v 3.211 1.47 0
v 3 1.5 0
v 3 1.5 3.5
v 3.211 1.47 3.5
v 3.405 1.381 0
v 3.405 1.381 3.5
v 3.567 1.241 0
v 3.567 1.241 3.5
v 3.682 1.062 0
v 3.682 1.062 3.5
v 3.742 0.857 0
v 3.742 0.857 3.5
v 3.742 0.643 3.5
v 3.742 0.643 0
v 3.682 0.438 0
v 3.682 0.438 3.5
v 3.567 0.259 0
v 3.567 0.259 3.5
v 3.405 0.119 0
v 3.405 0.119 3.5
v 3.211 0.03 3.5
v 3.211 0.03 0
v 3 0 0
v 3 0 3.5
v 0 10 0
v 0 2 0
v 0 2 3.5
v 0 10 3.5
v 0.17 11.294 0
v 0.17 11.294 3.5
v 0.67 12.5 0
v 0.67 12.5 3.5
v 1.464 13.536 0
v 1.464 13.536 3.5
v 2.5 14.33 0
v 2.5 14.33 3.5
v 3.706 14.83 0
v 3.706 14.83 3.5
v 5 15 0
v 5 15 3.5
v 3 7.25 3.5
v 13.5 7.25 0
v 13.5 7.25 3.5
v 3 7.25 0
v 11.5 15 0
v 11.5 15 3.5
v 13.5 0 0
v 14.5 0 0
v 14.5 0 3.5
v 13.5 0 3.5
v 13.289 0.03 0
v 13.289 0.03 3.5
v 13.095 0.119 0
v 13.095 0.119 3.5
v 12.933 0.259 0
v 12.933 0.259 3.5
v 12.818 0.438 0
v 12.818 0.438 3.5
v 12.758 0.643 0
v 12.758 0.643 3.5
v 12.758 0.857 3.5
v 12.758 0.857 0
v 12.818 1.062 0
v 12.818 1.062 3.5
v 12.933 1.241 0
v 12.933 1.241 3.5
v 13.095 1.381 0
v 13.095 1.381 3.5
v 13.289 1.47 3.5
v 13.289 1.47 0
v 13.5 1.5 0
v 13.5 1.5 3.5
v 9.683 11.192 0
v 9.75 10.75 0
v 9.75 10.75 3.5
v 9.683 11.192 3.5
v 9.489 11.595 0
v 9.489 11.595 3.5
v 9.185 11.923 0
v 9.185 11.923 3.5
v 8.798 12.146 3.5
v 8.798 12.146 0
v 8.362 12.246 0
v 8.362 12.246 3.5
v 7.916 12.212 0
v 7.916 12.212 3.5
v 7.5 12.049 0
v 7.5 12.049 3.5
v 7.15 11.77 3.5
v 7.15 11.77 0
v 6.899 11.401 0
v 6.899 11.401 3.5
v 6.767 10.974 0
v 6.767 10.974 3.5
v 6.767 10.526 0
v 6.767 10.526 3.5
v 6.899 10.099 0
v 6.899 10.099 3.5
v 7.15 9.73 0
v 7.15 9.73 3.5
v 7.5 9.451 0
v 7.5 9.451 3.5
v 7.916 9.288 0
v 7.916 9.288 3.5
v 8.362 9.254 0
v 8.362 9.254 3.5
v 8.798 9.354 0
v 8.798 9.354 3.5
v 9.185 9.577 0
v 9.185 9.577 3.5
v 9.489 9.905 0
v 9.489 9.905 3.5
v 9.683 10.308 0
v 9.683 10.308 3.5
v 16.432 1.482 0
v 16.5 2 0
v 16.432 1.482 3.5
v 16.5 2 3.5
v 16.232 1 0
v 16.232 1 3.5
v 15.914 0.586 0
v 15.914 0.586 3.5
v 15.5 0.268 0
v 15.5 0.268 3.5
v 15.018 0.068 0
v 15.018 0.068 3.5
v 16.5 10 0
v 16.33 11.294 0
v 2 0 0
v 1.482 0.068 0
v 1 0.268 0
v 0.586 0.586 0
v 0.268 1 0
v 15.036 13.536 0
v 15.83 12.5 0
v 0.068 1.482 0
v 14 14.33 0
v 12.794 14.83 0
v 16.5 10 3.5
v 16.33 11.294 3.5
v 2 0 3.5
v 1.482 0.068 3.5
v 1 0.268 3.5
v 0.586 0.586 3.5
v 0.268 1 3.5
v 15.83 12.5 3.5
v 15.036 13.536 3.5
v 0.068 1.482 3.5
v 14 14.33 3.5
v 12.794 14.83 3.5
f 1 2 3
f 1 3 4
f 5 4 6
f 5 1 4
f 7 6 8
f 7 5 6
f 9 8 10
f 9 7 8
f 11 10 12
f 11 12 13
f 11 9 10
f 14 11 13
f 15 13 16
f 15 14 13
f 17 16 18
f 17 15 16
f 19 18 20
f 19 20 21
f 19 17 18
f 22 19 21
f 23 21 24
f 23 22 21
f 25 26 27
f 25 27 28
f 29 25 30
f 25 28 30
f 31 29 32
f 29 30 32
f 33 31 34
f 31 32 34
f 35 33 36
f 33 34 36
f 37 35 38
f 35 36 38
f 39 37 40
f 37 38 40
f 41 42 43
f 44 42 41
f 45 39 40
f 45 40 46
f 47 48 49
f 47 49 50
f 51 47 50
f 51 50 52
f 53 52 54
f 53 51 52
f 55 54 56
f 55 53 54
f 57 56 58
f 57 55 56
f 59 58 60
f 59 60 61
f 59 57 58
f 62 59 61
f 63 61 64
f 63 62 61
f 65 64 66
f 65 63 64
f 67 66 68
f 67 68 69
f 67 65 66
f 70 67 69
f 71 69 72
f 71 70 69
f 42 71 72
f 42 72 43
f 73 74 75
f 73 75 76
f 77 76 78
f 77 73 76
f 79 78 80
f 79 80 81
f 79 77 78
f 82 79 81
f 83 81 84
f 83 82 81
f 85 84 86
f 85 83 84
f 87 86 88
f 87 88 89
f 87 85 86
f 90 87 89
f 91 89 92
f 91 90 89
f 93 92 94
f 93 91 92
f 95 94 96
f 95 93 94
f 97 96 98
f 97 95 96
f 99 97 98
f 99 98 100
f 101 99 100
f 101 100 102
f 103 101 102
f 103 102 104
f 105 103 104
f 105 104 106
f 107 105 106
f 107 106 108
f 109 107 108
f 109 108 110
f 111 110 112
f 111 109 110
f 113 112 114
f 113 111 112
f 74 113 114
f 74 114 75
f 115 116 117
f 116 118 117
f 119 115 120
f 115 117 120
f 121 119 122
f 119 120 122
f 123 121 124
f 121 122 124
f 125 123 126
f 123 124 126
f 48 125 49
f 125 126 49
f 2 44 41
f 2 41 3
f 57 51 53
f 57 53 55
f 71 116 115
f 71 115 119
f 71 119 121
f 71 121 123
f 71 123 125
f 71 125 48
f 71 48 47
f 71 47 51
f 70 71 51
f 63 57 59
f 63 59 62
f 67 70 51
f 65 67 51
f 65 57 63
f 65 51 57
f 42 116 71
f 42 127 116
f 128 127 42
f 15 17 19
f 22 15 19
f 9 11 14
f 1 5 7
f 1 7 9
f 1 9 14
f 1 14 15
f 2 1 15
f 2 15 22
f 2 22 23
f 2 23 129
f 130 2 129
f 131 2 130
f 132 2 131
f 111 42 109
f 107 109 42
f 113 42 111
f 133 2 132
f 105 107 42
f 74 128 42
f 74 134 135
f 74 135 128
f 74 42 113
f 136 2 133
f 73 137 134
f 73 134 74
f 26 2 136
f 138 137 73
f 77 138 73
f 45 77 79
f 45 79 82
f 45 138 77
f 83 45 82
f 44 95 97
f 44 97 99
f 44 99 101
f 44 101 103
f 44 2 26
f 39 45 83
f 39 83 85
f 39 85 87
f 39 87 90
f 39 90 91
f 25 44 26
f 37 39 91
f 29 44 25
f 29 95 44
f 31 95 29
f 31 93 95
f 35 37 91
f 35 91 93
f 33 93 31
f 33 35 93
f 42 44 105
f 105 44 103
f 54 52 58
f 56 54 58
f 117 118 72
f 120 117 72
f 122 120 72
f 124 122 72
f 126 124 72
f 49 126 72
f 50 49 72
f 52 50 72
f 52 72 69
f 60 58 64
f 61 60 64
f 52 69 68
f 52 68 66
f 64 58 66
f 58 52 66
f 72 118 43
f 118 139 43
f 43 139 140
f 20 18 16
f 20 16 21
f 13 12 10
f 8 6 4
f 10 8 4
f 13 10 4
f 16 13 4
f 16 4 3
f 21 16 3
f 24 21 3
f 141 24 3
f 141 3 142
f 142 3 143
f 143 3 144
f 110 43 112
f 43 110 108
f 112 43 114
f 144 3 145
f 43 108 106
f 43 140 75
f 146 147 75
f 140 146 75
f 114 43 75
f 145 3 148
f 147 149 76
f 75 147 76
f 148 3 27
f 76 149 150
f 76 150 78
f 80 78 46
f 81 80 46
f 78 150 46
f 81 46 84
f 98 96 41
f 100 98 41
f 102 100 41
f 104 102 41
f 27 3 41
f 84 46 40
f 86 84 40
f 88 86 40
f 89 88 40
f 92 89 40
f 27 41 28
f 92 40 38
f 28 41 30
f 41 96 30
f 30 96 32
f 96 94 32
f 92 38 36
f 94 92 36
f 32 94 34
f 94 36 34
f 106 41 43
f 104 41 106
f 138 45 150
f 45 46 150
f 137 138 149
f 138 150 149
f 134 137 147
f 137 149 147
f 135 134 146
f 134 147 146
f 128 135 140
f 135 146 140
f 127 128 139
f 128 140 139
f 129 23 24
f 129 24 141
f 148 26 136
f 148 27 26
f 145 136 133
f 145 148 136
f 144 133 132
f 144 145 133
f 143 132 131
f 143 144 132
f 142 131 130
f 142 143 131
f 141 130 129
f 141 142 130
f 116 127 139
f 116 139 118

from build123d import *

# Parameters (mm, degrees)
SKETCH1_R           = 1.5
BOSS_EXTRUDE1_DEPTH = 3.5
FILLET1_R           = 2
FILLET2_R           = 5


with BuildPart() as part:
    # Sketch1 → Boss-Extrude1 (new body)
    with BuildSketch(Plane.XY):
        with BuildLine():
            Line((0, 15), (16.5, 15))
            Line((16.5, 15), (16.5, 0))
            Line((16.5, 0), (13.5, 0))
            ThreePointArc((13.5, 0), (12.75, 0.75), (13.5, 1.5))
            Line((13.5, 1.5), (13.5, 7.25))
            Line((13.5, 7.25), (3, 7.25))
            Line((3, 7.25), (3, 1.5))
            ThreePointArc((3, 1.5), (3.75, 0.75), (3, 0))
            Line((3, 0), (0, 0))
            Line((0, 0), (0, 15))
        make_face()
        with Locations((8.25, 10.75)):
            Circle(SKETCH1_R, mode=Mode.SUBTRACT)
    extrude(amount=BOSS_EXTRUDE1_DEPTH)

    # Fillet1
    fillet1_edges = [part.edges().sort_by_distance(p)[0] for p in [
        (16.5, 0, 1.75),
        (0, 0, 1.75),
    ]]
    fillet(fillet1_edges, radius=FILLET1_R)

    # Fillet2
    fillet2_edges = [part.edges().sort_by_distance(p)[0] for p in [
        (0, 15, 1.75),
        (16.5, 15, 1.75),
    ]]
    fillet(fillet2_edges, radius=FILLET2_R)


solid = part.part
